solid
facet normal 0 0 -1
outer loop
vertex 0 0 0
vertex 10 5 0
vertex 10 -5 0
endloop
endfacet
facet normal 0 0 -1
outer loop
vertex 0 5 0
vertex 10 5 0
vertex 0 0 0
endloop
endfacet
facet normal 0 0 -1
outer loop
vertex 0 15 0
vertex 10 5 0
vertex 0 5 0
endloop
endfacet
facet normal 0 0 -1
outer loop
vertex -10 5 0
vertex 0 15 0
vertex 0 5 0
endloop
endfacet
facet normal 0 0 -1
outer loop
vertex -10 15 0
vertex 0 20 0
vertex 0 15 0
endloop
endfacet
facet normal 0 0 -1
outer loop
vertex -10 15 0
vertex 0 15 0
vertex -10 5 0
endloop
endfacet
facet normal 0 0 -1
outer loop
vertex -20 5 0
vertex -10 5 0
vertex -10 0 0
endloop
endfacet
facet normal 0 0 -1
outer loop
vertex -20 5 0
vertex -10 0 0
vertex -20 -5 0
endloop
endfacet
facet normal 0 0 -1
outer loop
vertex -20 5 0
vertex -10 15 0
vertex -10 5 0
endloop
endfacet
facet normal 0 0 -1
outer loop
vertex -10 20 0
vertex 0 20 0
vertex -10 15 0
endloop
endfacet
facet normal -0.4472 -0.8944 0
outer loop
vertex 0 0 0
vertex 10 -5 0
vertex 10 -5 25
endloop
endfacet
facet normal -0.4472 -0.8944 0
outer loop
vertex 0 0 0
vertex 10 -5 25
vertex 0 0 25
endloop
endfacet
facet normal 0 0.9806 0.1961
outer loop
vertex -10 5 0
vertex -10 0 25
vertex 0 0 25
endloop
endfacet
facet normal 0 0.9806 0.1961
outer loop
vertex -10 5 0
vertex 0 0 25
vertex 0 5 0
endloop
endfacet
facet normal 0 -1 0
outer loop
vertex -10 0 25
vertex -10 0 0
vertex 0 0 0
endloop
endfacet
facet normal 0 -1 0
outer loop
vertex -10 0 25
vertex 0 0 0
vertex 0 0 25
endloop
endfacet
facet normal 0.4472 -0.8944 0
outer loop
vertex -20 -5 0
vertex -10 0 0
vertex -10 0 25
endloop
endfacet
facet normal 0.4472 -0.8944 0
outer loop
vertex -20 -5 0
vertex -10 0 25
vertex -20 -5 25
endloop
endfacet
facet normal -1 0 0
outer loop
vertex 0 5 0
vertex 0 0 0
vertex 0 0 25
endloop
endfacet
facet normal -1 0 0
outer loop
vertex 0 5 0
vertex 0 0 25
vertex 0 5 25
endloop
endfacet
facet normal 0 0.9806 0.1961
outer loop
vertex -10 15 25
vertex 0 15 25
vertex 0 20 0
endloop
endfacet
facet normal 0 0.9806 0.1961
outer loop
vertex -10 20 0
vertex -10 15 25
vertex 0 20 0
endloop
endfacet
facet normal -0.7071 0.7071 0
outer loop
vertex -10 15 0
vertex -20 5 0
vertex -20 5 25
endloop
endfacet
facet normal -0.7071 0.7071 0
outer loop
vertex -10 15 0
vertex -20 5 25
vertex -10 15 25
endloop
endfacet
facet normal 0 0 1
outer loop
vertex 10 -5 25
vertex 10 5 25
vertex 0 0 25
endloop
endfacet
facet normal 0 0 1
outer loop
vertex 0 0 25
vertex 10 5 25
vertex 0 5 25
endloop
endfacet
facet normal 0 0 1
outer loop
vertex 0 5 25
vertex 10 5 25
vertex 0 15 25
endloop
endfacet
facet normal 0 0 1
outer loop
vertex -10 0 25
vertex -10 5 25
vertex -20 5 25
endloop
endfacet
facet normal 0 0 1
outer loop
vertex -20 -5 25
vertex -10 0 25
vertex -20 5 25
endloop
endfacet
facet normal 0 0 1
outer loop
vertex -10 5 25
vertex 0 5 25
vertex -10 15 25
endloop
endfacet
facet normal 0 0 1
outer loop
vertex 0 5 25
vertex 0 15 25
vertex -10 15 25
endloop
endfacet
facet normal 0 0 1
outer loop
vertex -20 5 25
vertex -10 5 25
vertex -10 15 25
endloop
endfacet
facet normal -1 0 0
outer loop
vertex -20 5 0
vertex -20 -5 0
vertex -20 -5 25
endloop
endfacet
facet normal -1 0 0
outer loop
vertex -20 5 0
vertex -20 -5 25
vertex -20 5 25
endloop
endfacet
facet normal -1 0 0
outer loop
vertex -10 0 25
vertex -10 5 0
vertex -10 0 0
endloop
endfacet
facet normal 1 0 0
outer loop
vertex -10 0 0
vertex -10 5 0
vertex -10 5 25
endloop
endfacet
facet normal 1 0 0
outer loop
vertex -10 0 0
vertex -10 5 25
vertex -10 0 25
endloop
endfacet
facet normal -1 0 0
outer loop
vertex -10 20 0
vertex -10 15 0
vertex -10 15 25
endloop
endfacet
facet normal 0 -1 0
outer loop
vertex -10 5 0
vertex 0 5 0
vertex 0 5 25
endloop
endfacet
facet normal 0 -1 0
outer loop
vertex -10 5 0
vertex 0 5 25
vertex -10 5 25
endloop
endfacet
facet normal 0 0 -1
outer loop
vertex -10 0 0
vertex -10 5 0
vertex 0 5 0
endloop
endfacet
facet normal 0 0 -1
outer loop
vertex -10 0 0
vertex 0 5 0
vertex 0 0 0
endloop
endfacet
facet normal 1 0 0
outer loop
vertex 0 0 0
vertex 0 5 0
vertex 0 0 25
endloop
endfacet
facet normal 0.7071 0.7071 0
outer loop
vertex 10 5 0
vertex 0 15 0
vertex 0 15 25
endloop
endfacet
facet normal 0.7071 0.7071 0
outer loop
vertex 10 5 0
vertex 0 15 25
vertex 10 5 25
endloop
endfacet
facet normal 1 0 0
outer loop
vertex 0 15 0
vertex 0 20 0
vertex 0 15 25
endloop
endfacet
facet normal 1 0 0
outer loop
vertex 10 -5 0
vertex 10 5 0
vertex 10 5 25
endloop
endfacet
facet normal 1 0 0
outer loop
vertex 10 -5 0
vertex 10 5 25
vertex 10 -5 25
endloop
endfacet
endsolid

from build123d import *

# Parameters (mm, degrees)
BOSS_EXTRUDE1_DEPTH = 25
CUT_EXTRUDE1_DEPTH  = 25
BOSS_EXTRUDE3_DEPTH = 10


with BuildPart() as part:
    # Sketch1 → Boss-Extrude1 (new body)
    with BuildSketch(Plane.XY):
        Polygon((-10, 15), (-10, 20), (0, 20), (0, 15), (10, 5), (10, -5), (0, 0), (0, 5), (-10, 5), (-10, 0), (-20, -5), (-20, 5), align=None)
    extrude(amount=BOSS_EXTRUDE1_DEPTH)

    # Sketch2 → Cut-Extrude1 (cut)
    with BuildSketch(Plane(origin=(0, 0, 0), x_dir=(0, 0, -1), z_dir=(1, 0, 0))):
        Polygon((-25, 15), (0, 20), (-25, 20), align=None)
    extrude(amount=-CUT_EXTRUDE1_DEPTH, mode=Mode.SUBTRACT)


with BuildPart() as body_2:
    # Sketch3 → Boss-Extrude3 (new body)
    with BuildSketch(Plane(origin=(-10, 0, 0), x_dir=(0, 0, -1), z_dir=(1, 0, 0))):
        Polygon((-25, 0), (0, 5), (0, 0), align=None)
    extrude(amount=BOSS_EXTRUDE3_DEPTH)


solid = Compound([part.part, body_2.part])
